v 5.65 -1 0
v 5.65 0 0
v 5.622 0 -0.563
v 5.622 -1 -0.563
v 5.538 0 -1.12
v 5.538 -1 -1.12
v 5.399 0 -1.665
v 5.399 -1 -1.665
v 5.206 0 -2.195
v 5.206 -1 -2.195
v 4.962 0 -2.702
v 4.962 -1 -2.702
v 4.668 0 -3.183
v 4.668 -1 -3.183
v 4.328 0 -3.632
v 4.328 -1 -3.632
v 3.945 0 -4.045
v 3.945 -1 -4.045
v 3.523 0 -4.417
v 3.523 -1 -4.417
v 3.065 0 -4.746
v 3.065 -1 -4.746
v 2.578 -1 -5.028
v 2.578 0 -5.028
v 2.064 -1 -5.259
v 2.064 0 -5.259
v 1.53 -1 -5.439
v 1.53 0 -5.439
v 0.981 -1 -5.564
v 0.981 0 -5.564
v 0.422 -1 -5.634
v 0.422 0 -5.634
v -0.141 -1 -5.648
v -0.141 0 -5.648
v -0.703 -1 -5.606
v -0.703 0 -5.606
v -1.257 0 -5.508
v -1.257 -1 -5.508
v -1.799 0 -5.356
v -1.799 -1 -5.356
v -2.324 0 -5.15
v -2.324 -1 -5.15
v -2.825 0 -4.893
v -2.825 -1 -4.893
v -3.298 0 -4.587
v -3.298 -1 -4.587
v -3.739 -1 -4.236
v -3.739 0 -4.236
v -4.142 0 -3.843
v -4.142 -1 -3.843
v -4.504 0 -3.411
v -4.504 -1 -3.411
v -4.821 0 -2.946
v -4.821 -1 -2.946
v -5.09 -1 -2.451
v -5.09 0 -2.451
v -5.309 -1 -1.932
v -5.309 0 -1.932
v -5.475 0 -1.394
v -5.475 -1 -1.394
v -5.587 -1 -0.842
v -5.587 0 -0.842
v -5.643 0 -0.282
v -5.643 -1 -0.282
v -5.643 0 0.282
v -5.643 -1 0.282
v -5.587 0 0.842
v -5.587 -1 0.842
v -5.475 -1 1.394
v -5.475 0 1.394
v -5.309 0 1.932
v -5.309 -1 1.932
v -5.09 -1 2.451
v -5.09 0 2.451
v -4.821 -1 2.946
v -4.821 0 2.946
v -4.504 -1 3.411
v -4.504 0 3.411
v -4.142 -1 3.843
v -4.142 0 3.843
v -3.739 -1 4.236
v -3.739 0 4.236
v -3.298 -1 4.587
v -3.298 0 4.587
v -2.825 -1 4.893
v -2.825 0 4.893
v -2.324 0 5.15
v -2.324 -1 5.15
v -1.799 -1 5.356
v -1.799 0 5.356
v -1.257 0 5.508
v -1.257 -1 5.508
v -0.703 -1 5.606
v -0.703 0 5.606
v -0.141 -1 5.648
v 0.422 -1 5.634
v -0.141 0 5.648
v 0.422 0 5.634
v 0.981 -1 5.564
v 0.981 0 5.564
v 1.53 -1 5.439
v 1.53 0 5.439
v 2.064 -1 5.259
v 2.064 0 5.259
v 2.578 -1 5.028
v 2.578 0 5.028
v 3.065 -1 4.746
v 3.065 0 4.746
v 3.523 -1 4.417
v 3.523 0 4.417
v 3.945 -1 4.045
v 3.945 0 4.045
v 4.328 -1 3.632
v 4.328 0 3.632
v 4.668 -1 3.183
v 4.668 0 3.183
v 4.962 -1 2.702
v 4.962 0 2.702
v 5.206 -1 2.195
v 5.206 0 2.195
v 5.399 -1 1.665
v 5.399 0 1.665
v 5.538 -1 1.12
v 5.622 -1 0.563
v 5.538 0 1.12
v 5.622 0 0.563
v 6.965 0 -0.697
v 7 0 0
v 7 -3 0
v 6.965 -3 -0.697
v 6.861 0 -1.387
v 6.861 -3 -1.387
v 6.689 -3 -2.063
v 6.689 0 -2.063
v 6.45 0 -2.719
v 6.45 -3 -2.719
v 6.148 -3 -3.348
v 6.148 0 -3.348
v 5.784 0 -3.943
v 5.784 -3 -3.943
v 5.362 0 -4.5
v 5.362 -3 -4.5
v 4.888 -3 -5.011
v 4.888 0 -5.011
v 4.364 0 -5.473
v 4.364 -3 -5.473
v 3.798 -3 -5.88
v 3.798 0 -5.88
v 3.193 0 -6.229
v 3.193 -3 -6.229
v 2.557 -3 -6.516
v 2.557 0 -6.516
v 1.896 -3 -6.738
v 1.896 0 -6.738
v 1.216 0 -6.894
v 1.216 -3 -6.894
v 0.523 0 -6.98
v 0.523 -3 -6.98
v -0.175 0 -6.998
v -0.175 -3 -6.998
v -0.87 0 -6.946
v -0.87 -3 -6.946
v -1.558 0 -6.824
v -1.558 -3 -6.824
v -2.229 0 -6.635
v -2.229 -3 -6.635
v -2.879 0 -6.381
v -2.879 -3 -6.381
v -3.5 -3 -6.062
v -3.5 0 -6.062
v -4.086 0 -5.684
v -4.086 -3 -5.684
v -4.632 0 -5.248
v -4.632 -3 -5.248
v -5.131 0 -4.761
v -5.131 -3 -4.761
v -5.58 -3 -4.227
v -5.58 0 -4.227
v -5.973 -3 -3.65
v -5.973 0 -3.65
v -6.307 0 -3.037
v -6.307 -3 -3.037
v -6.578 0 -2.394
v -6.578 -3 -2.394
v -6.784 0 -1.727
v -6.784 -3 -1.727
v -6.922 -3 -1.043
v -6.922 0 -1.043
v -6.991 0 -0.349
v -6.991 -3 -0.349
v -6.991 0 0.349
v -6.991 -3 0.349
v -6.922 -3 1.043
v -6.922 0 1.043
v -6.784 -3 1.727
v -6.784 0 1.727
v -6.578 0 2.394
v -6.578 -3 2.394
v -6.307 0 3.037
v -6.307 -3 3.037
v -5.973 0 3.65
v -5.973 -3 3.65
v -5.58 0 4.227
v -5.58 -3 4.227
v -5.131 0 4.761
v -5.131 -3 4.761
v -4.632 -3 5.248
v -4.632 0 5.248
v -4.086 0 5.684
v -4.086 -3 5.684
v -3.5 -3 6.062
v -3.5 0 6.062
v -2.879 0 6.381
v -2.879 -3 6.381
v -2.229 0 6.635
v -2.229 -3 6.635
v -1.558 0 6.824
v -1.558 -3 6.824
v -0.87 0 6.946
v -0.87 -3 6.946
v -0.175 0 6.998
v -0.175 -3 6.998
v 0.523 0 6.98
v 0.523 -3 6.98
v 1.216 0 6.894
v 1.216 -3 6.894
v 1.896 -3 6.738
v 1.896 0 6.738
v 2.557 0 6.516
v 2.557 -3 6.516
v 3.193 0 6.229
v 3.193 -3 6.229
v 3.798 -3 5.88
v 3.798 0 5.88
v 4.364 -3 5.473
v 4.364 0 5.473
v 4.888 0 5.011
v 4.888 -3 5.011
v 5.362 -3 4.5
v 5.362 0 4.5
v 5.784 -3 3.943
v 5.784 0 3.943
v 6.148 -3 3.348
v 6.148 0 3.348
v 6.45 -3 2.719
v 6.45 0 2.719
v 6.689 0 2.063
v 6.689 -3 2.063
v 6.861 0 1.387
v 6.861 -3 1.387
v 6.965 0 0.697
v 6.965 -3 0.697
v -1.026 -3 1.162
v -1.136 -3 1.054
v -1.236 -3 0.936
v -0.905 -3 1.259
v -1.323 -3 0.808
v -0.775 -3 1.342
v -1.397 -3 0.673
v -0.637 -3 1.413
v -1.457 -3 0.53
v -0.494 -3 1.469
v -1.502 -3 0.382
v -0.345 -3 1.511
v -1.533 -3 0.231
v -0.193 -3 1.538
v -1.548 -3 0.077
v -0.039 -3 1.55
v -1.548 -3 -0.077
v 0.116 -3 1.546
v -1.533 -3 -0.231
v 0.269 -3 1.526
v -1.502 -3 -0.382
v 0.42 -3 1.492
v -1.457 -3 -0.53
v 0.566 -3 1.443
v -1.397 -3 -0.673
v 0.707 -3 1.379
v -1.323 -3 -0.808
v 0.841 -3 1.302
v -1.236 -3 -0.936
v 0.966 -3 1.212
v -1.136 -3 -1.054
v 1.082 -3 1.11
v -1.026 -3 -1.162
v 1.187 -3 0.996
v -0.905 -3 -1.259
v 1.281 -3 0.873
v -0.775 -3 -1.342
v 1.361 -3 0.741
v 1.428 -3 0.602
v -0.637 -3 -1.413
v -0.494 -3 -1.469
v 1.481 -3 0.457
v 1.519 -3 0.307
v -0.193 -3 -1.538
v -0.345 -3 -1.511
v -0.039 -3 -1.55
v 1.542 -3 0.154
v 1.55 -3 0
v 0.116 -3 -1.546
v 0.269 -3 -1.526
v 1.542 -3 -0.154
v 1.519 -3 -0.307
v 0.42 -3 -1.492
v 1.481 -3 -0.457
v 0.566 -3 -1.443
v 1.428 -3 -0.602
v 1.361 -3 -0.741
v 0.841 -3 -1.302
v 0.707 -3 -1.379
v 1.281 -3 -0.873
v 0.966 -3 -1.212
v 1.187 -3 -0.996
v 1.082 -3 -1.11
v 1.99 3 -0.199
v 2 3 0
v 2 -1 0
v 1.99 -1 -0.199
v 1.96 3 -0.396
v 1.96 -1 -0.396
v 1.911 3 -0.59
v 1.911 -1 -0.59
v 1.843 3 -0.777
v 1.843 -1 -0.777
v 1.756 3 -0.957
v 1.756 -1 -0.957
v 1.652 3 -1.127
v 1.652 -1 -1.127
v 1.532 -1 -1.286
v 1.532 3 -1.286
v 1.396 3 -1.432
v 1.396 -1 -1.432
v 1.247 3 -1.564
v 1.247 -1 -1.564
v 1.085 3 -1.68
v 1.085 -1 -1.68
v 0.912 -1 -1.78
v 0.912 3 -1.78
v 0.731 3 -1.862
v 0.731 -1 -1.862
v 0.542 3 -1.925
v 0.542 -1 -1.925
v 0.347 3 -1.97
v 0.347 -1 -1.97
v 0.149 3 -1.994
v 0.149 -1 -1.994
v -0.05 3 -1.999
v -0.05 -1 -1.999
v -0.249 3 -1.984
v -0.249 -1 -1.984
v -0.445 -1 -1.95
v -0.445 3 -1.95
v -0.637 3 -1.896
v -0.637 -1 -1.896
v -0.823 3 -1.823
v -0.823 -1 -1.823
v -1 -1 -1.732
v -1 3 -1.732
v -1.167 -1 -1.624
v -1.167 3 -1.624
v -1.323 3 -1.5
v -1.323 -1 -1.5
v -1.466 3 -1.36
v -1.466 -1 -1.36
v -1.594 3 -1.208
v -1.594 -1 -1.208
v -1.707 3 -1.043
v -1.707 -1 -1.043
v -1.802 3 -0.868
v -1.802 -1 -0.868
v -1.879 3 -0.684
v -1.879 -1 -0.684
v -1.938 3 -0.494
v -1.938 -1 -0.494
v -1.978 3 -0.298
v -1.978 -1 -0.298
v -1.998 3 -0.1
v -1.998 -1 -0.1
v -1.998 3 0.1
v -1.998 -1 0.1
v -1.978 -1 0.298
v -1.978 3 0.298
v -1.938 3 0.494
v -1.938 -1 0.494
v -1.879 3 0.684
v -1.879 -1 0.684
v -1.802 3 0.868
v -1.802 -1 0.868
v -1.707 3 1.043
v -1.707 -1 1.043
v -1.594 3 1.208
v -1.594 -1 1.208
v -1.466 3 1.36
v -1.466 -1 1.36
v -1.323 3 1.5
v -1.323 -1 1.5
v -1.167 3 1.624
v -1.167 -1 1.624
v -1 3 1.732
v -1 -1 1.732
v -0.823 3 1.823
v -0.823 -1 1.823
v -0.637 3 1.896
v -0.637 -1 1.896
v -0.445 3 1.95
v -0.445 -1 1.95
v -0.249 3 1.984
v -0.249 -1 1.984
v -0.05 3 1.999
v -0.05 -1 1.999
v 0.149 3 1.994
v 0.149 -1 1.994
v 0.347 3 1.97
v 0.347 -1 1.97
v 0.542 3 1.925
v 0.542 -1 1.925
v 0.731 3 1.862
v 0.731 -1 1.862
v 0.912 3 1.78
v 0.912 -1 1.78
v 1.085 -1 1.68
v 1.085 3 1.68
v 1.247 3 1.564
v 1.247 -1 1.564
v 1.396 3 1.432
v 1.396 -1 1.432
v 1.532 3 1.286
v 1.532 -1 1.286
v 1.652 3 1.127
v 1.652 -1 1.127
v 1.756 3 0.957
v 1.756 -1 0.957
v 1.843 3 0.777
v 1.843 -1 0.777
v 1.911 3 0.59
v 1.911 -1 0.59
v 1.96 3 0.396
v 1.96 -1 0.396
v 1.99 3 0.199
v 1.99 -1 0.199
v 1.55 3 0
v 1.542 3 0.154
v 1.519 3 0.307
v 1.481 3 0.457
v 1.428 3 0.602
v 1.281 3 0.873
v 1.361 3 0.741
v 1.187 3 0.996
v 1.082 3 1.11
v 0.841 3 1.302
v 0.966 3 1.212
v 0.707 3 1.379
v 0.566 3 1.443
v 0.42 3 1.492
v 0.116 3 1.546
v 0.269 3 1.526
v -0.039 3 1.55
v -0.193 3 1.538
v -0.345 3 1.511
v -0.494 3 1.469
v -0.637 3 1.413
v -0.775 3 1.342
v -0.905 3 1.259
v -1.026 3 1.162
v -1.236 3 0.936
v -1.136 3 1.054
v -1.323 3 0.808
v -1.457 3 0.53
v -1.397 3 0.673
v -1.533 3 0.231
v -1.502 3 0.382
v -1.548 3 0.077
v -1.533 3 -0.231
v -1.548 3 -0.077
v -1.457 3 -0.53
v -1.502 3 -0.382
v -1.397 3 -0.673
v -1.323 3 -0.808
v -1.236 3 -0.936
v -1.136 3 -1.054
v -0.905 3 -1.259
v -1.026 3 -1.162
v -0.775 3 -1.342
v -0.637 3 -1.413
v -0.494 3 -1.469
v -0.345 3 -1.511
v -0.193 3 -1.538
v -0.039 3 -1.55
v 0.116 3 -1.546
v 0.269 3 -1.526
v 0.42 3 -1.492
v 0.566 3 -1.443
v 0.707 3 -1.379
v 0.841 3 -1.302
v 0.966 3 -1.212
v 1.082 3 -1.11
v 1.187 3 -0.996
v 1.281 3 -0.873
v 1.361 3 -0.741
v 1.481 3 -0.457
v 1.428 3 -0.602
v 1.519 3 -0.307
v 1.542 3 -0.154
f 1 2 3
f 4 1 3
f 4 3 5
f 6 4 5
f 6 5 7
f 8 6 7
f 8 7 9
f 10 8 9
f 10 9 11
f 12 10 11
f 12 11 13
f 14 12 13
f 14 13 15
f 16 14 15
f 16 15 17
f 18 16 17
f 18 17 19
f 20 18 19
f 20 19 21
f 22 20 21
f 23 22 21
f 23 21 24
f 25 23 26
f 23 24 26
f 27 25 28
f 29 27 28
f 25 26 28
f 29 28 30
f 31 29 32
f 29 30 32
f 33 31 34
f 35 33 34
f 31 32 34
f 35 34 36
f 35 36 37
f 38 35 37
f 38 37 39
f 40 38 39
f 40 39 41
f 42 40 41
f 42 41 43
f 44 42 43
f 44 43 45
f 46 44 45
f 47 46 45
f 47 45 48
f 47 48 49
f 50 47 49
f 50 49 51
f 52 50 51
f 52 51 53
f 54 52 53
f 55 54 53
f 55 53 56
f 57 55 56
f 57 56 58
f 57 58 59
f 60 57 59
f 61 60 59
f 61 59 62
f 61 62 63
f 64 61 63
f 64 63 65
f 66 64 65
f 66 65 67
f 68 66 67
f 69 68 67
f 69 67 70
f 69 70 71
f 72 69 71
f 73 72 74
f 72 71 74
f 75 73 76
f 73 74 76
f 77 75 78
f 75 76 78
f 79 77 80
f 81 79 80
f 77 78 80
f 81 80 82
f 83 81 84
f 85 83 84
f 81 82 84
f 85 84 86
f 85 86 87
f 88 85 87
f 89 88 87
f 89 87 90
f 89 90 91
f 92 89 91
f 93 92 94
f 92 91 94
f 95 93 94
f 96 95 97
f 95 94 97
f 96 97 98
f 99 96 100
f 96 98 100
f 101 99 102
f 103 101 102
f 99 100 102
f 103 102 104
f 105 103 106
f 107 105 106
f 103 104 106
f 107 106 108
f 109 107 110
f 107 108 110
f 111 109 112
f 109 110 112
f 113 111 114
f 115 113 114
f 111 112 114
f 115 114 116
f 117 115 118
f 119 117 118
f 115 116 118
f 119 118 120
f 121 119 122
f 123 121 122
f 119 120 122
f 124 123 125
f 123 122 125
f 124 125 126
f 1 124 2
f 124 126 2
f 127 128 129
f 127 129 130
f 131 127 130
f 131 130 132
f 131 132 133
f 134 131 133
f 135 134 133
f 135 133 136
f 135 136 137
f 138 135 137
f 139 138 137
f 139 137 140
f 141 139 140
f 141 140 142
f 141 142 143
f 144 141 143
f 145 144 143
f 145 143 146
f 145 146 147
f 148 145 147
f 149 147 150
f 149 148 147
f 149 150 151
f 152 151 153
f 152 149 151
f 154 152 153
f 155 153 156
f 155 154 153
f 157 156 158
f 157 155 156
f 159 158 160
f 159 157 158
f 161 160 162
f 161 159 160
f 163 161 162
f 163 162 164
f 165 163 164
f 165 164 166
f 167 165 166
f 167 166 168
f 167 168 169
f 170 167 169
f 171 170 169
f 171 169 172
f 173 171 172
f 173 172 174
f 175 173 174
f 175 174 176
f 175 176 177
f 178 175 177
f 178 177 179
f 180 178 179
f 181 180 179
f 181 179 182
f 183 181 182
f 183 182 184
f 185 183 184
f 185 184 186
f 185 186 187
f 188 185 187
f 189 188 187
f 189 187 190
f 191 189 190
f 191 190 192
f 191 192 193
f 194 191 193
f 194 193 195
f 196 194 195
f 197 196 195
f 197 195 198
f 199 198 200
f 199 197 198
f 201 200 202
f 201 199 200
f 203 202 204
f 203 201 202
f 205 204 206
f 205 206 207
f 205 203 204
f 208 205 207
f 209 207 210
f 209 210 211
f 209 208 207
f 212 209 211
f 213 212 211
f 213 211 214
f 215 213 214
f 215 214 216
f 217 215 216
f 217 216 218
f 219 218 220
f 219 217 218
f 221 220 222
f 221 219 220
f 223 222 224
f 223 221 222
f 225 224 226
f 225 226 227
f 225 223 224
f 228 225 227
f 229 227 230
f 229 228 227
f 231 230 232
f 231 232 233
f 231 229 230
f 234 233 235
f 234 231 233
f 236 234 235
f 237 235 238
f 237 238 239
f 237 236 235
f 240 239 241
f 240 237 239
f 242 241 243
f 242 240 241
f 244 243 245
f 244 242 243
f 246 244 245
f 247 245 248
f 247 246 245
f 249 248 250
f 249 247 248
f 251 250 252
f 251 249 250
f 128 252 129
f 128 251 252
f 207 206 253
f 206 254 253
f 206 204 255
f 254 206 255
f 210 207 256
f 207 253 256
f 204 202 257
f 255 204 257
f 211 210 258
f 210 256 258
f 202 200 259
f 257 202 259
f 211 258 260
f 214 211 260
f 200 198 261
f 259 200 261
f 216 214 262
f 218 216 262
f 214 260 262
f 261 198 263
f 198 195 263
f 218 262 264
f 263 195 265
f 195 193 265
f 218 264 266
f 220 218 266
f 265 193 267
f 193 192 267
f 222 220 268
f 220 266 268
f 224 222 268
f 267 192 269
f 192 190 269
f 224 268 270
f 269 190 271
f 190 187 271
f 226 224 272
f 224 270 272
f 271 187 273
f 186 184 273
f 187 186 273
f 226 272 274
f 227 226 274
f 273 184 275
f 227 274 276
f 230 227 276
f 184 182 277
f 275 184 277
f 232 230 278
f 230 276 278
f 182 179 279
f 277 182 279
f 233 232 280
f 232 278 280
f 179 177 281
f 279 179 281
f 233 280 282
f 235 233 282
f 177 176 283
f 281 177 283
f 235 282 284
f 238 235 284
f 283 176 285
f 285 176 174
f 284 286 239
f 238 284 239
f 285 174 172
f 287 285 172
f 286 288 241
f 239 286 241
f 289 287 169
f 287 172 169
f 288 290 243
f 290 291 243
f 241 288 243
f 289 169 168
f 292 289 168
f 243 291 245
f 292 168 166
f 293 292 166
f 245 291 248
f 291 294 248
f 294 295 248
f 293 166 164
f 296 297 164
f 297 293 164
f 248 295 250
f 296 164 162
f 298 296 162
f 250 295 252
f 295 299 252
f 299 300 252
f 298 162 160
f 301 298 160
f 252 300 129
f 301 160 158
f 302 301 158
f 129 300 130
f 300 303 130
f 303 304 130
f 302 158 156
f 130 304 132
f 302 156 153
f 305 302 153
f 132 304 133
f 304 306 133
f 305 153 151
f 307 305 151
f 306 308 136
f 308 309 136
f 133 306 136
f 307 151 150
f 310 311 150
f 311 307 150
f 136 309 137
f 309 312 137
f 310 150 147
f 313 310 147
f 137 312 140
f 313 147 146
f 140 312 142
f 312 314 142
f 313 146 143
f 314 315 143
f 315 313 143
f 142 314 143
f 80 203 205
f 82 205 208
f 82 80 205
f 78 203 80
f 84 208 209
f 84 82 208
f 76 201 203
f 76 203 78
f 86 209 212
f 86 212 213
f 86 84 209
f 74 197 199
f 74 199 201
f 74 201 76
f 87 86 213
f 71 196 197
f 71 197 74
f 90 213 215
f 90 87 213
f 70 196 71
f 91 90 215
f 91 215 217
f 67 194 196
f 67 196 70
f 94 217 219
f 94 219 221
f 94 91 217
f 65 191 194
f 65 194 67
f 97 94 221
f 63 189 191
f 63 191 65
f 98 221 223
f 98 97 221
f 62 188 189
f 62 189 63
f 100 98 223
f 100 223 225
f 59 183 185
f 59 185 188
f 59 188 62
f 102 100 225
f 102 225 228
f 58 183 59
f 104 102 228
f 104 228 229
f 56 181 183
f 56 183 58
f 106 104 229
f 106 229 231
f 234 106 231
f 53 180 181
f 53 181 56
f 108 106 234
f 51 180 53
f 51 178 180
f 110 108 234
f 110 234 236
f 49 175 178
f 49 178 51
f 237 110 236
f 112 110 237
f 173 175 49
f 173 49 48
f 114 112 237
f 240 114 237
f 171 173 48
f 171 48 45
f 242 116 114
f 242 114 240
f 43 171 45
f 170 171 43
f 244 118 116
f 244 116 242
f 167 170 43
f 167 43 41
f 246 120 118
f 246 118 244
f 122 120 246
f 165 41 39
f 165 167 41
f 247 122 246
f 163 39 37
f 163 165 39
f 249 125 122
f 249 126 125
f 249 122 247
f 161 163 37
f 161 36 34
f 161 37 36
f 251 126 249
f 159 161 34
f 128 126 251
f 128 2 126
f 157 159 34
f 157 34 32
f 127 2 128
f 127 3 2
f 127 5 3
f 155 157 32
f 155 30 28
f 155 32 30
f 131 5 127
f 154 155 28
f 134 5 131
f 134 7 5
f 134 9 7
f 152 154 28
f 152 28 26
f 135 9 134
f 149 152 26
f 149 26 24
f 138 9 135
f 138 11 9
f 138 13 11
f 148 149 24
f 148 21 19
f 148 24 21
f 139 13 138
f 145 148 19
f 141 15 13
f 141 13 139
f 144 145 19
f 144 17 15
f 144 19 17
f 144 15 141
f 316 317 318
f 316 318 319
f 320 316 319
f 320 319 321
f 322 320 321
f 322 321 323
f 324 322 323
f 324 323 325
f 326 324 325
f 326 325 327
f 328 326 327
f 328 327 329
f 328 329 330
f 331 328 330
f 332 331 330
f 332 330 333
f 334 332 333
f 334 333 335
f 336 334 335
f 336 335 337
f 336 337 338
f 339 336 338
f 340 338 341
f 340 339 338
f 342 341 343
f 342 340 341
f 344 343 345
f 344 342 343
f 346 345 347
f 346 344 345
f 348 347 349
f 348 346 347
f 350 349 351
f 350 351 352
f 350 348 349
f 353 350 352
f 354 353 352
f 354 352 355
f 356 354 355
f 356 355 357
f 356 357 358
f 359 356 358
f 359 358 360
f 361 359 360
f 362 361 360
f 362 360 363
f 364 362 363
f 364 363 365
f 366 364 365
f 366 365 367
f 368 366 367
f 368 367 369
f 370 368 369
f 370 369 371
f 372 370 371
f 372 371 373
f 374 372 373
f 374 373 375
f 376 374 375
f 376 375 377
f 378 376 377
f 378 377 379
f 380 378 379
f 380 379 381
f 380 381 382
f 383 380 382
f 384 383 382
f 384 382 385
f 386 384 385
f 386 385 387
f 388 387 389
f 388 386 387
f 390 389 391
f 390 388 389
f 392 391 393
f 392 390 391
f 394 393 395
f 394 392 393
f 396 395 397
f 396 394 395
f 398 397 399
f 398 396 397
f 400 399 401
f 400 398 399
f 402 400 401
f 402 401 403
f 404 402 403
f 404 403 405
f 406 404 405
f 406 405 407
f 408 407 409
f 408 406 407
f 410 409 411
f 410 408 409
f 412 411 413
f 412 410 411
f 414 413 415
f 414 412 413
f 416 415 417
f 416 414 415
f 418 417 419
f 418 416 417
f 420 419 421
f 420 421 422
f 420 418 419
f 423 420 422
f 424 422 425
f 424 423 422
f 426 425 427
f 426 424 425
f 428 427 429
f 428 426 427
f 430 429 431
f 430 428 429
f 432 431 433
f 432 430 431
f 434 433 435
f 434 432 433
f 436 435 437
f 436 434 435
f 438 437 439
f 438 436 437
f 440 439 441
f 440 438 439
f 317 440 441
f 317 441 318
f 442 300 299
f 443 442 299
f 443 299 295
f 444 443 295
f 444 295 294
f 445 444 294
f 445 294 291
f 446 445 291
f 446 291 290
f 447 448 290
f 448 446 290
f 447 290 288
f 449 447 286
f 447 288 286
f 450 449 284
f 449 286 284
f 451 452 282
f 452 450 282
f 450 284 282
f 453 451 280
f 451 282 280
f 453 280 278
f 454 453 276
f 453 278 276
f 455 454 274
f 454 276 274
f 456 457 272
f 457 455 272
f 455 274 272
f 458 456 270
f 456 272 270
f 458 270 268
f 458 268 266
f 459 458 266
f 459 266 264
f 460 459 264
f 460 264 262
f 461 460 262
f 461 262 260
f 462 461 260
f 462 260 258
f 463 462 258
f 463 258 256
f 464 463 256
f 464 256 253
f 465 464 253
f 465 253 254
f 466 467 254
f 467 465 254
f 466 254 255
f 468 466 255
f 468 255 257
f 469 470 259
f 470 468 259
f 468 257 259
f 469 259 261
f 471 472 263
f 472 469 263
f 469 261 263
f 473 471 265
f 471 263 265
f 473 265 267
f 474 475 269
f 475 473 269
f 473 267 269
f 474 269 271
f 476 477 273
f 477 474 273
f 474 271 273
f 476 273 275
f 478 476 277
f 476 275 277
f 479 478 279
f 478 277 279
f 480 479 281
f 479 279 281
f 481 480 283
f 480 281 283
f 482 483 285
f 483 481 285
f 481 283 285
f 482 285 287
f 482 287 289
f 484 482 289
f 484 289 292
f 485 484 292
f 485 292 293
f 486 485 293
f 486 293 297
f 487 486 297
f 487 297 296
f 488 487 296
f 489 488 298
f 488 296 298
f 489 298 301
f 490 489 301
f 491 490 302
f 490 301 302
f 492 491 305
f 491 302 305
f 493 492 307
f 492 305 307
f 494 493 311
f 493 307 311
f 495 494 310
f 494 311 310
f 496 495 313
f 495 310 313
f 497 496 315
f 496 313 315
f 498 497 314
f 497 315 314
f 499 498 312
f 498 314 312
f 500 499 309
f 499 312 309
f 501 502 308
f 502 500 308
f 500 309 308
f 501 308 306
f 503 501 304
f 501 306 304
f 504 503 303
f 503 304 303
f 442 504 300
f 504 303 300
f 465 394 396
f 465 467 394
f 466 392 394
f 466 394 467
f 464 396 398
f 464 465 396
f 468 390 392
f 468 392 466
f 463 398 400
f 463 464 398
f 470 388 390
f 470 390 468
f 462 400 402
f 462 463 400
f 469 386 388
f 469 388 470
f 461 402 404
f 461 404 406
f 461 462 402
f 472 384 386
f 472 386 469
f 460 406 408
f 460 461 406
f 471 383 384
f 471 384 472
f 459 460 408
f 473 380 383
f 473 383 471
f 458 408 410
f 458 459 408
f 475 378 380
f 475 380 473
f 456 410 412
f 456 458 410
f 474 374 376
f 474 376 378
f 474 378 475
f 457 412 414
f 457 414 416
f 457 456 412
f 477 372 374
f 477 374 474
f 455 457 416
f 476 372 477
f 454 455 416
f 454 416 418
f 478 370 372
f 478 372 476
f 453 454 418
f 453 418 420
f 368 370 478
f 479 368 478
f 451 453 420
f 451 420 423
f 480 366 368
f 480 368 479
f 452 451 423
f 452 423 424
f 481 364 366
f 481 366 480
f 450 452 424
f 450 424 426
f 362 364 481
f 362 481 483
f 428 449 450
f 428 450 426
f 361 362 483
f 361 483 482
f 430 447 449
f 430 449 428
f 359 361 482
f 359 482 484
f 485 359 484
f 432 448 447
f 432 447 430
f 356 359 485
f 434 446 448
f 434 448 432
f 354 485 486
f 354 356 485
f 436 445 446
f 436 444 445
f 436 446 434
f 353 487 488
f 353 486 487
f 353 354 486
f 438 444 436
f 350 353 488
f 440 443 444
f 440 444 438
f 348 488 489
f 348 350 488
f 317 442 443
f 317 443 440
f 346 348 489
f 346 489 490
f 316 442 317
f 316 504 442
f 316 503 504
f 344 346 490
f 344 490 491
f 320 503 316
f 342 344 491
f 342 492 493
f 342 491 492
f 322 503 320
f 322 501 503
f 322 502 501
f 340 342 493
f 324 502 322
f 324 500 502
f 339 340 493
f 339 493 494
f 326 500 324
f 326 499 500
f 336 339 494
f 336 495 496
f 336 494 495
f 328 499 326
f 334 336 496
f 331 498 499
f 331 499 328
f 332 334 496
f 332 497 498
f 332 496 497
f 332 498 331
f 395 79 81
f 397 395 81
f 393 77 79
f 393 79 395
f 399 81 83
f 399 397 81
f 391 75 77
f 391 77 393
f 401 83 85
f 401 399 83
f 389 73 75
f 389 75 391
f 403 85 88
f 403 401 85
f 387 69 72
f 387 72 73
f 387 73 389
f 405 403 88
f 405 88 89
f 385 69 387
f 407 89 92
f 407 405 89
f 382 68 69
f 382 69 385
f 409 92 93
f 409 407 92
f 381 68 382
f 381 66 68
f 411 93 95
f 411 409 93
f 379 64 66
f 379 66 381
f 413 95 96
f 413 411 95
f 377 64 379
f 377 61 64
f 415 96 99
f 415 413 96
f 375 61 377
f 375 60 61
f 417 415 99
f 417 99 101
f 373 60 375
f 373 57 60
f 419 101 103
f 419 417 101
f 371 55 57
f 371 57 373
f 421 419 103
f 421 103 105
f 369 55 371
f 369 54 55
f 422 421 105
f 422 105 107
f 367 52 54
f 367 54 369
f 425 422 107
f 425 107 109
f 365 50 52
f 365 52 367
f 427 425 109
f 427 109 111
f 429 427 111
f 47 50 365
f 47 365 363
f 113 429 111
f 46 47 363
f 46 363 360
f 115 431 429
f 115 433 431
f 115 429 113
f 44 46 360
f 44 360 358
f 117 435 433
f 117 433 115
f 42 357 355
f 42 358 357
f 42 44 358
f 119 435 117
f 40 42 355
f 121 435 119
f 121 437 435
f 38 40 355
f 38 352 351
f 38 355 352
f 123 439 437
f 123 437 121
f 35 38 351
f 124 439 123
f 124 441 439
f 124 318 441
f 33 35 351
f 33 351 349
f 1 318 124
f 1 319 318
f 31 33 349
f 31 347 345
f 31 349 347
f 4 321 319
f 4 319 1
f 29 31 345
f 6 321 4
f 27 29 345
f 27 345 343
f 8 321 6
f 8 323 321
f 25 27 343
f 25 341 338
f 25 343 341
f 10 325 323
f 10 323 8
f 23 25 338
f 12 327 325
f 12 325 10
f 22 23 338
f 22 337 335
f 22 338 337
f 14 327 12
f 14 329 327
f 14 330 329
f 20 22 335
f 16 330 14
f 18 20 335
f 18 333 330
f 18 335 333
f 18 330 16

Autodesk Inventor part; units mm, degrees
ref_plane "YZ Plane" through (0, 0, 0) normal (1, 0, 0) x (0, 1, 0)
ref_plane "XZ Plane" through (0, 0, 0) normal (0, 1, 0) x (-1, 0, 0)
ref_plane "XY Plane" through (0, 0, 0) normal (0, 0, 1) x (1, 0, 0)
sketch "スケッチ1" plane through (0, 0, 0) normal (0, 0, 1) x (1, 0, 0)
  line L0 (1.55, 3) -> (1.55, -3)
  line L1 (1.55, -3) -> (7, -3)
  line L2 (7, -3) -> (7, 0)
  line L3 (7, 0) -> (2, 0)
  line L4 (2, 0) -> (2, 3)
  line L5 (2, 3) -> (1.55, 3)
  line L6 (0, -4.2) -> (0, 4.2) projected
  point P0 (0, 0)
  point P1 (1.55, 0)
  dimension "d0" = 1.55
  dimension "d1" = 2
  dimension "d2" = 3
  dimension "d3" = 7
  dimension "d4" = 3
revolve "回転1" add sketch "スケッチ1" angle 360 about axis through (0, -10, 0) along (0, 1, 0)
sketch "スケッチ2" plane through (0, 0, 0) normal (0, 1, 0) x (1, 0, 0)
  circle A0 centre (0, 0) radius 2 projected
  circle A1 centre (0, 0) radius 7 projected
  circle A2 centre (0, 0) radius 5.65
  dimension "d6" = 11.3
extrude "押し出し1" cut sketch "スケッチ2" against normal blind 1 contours A2
properties part number "付け根_サブフレーム_1_4" material "アセタール樹脂、黒"
